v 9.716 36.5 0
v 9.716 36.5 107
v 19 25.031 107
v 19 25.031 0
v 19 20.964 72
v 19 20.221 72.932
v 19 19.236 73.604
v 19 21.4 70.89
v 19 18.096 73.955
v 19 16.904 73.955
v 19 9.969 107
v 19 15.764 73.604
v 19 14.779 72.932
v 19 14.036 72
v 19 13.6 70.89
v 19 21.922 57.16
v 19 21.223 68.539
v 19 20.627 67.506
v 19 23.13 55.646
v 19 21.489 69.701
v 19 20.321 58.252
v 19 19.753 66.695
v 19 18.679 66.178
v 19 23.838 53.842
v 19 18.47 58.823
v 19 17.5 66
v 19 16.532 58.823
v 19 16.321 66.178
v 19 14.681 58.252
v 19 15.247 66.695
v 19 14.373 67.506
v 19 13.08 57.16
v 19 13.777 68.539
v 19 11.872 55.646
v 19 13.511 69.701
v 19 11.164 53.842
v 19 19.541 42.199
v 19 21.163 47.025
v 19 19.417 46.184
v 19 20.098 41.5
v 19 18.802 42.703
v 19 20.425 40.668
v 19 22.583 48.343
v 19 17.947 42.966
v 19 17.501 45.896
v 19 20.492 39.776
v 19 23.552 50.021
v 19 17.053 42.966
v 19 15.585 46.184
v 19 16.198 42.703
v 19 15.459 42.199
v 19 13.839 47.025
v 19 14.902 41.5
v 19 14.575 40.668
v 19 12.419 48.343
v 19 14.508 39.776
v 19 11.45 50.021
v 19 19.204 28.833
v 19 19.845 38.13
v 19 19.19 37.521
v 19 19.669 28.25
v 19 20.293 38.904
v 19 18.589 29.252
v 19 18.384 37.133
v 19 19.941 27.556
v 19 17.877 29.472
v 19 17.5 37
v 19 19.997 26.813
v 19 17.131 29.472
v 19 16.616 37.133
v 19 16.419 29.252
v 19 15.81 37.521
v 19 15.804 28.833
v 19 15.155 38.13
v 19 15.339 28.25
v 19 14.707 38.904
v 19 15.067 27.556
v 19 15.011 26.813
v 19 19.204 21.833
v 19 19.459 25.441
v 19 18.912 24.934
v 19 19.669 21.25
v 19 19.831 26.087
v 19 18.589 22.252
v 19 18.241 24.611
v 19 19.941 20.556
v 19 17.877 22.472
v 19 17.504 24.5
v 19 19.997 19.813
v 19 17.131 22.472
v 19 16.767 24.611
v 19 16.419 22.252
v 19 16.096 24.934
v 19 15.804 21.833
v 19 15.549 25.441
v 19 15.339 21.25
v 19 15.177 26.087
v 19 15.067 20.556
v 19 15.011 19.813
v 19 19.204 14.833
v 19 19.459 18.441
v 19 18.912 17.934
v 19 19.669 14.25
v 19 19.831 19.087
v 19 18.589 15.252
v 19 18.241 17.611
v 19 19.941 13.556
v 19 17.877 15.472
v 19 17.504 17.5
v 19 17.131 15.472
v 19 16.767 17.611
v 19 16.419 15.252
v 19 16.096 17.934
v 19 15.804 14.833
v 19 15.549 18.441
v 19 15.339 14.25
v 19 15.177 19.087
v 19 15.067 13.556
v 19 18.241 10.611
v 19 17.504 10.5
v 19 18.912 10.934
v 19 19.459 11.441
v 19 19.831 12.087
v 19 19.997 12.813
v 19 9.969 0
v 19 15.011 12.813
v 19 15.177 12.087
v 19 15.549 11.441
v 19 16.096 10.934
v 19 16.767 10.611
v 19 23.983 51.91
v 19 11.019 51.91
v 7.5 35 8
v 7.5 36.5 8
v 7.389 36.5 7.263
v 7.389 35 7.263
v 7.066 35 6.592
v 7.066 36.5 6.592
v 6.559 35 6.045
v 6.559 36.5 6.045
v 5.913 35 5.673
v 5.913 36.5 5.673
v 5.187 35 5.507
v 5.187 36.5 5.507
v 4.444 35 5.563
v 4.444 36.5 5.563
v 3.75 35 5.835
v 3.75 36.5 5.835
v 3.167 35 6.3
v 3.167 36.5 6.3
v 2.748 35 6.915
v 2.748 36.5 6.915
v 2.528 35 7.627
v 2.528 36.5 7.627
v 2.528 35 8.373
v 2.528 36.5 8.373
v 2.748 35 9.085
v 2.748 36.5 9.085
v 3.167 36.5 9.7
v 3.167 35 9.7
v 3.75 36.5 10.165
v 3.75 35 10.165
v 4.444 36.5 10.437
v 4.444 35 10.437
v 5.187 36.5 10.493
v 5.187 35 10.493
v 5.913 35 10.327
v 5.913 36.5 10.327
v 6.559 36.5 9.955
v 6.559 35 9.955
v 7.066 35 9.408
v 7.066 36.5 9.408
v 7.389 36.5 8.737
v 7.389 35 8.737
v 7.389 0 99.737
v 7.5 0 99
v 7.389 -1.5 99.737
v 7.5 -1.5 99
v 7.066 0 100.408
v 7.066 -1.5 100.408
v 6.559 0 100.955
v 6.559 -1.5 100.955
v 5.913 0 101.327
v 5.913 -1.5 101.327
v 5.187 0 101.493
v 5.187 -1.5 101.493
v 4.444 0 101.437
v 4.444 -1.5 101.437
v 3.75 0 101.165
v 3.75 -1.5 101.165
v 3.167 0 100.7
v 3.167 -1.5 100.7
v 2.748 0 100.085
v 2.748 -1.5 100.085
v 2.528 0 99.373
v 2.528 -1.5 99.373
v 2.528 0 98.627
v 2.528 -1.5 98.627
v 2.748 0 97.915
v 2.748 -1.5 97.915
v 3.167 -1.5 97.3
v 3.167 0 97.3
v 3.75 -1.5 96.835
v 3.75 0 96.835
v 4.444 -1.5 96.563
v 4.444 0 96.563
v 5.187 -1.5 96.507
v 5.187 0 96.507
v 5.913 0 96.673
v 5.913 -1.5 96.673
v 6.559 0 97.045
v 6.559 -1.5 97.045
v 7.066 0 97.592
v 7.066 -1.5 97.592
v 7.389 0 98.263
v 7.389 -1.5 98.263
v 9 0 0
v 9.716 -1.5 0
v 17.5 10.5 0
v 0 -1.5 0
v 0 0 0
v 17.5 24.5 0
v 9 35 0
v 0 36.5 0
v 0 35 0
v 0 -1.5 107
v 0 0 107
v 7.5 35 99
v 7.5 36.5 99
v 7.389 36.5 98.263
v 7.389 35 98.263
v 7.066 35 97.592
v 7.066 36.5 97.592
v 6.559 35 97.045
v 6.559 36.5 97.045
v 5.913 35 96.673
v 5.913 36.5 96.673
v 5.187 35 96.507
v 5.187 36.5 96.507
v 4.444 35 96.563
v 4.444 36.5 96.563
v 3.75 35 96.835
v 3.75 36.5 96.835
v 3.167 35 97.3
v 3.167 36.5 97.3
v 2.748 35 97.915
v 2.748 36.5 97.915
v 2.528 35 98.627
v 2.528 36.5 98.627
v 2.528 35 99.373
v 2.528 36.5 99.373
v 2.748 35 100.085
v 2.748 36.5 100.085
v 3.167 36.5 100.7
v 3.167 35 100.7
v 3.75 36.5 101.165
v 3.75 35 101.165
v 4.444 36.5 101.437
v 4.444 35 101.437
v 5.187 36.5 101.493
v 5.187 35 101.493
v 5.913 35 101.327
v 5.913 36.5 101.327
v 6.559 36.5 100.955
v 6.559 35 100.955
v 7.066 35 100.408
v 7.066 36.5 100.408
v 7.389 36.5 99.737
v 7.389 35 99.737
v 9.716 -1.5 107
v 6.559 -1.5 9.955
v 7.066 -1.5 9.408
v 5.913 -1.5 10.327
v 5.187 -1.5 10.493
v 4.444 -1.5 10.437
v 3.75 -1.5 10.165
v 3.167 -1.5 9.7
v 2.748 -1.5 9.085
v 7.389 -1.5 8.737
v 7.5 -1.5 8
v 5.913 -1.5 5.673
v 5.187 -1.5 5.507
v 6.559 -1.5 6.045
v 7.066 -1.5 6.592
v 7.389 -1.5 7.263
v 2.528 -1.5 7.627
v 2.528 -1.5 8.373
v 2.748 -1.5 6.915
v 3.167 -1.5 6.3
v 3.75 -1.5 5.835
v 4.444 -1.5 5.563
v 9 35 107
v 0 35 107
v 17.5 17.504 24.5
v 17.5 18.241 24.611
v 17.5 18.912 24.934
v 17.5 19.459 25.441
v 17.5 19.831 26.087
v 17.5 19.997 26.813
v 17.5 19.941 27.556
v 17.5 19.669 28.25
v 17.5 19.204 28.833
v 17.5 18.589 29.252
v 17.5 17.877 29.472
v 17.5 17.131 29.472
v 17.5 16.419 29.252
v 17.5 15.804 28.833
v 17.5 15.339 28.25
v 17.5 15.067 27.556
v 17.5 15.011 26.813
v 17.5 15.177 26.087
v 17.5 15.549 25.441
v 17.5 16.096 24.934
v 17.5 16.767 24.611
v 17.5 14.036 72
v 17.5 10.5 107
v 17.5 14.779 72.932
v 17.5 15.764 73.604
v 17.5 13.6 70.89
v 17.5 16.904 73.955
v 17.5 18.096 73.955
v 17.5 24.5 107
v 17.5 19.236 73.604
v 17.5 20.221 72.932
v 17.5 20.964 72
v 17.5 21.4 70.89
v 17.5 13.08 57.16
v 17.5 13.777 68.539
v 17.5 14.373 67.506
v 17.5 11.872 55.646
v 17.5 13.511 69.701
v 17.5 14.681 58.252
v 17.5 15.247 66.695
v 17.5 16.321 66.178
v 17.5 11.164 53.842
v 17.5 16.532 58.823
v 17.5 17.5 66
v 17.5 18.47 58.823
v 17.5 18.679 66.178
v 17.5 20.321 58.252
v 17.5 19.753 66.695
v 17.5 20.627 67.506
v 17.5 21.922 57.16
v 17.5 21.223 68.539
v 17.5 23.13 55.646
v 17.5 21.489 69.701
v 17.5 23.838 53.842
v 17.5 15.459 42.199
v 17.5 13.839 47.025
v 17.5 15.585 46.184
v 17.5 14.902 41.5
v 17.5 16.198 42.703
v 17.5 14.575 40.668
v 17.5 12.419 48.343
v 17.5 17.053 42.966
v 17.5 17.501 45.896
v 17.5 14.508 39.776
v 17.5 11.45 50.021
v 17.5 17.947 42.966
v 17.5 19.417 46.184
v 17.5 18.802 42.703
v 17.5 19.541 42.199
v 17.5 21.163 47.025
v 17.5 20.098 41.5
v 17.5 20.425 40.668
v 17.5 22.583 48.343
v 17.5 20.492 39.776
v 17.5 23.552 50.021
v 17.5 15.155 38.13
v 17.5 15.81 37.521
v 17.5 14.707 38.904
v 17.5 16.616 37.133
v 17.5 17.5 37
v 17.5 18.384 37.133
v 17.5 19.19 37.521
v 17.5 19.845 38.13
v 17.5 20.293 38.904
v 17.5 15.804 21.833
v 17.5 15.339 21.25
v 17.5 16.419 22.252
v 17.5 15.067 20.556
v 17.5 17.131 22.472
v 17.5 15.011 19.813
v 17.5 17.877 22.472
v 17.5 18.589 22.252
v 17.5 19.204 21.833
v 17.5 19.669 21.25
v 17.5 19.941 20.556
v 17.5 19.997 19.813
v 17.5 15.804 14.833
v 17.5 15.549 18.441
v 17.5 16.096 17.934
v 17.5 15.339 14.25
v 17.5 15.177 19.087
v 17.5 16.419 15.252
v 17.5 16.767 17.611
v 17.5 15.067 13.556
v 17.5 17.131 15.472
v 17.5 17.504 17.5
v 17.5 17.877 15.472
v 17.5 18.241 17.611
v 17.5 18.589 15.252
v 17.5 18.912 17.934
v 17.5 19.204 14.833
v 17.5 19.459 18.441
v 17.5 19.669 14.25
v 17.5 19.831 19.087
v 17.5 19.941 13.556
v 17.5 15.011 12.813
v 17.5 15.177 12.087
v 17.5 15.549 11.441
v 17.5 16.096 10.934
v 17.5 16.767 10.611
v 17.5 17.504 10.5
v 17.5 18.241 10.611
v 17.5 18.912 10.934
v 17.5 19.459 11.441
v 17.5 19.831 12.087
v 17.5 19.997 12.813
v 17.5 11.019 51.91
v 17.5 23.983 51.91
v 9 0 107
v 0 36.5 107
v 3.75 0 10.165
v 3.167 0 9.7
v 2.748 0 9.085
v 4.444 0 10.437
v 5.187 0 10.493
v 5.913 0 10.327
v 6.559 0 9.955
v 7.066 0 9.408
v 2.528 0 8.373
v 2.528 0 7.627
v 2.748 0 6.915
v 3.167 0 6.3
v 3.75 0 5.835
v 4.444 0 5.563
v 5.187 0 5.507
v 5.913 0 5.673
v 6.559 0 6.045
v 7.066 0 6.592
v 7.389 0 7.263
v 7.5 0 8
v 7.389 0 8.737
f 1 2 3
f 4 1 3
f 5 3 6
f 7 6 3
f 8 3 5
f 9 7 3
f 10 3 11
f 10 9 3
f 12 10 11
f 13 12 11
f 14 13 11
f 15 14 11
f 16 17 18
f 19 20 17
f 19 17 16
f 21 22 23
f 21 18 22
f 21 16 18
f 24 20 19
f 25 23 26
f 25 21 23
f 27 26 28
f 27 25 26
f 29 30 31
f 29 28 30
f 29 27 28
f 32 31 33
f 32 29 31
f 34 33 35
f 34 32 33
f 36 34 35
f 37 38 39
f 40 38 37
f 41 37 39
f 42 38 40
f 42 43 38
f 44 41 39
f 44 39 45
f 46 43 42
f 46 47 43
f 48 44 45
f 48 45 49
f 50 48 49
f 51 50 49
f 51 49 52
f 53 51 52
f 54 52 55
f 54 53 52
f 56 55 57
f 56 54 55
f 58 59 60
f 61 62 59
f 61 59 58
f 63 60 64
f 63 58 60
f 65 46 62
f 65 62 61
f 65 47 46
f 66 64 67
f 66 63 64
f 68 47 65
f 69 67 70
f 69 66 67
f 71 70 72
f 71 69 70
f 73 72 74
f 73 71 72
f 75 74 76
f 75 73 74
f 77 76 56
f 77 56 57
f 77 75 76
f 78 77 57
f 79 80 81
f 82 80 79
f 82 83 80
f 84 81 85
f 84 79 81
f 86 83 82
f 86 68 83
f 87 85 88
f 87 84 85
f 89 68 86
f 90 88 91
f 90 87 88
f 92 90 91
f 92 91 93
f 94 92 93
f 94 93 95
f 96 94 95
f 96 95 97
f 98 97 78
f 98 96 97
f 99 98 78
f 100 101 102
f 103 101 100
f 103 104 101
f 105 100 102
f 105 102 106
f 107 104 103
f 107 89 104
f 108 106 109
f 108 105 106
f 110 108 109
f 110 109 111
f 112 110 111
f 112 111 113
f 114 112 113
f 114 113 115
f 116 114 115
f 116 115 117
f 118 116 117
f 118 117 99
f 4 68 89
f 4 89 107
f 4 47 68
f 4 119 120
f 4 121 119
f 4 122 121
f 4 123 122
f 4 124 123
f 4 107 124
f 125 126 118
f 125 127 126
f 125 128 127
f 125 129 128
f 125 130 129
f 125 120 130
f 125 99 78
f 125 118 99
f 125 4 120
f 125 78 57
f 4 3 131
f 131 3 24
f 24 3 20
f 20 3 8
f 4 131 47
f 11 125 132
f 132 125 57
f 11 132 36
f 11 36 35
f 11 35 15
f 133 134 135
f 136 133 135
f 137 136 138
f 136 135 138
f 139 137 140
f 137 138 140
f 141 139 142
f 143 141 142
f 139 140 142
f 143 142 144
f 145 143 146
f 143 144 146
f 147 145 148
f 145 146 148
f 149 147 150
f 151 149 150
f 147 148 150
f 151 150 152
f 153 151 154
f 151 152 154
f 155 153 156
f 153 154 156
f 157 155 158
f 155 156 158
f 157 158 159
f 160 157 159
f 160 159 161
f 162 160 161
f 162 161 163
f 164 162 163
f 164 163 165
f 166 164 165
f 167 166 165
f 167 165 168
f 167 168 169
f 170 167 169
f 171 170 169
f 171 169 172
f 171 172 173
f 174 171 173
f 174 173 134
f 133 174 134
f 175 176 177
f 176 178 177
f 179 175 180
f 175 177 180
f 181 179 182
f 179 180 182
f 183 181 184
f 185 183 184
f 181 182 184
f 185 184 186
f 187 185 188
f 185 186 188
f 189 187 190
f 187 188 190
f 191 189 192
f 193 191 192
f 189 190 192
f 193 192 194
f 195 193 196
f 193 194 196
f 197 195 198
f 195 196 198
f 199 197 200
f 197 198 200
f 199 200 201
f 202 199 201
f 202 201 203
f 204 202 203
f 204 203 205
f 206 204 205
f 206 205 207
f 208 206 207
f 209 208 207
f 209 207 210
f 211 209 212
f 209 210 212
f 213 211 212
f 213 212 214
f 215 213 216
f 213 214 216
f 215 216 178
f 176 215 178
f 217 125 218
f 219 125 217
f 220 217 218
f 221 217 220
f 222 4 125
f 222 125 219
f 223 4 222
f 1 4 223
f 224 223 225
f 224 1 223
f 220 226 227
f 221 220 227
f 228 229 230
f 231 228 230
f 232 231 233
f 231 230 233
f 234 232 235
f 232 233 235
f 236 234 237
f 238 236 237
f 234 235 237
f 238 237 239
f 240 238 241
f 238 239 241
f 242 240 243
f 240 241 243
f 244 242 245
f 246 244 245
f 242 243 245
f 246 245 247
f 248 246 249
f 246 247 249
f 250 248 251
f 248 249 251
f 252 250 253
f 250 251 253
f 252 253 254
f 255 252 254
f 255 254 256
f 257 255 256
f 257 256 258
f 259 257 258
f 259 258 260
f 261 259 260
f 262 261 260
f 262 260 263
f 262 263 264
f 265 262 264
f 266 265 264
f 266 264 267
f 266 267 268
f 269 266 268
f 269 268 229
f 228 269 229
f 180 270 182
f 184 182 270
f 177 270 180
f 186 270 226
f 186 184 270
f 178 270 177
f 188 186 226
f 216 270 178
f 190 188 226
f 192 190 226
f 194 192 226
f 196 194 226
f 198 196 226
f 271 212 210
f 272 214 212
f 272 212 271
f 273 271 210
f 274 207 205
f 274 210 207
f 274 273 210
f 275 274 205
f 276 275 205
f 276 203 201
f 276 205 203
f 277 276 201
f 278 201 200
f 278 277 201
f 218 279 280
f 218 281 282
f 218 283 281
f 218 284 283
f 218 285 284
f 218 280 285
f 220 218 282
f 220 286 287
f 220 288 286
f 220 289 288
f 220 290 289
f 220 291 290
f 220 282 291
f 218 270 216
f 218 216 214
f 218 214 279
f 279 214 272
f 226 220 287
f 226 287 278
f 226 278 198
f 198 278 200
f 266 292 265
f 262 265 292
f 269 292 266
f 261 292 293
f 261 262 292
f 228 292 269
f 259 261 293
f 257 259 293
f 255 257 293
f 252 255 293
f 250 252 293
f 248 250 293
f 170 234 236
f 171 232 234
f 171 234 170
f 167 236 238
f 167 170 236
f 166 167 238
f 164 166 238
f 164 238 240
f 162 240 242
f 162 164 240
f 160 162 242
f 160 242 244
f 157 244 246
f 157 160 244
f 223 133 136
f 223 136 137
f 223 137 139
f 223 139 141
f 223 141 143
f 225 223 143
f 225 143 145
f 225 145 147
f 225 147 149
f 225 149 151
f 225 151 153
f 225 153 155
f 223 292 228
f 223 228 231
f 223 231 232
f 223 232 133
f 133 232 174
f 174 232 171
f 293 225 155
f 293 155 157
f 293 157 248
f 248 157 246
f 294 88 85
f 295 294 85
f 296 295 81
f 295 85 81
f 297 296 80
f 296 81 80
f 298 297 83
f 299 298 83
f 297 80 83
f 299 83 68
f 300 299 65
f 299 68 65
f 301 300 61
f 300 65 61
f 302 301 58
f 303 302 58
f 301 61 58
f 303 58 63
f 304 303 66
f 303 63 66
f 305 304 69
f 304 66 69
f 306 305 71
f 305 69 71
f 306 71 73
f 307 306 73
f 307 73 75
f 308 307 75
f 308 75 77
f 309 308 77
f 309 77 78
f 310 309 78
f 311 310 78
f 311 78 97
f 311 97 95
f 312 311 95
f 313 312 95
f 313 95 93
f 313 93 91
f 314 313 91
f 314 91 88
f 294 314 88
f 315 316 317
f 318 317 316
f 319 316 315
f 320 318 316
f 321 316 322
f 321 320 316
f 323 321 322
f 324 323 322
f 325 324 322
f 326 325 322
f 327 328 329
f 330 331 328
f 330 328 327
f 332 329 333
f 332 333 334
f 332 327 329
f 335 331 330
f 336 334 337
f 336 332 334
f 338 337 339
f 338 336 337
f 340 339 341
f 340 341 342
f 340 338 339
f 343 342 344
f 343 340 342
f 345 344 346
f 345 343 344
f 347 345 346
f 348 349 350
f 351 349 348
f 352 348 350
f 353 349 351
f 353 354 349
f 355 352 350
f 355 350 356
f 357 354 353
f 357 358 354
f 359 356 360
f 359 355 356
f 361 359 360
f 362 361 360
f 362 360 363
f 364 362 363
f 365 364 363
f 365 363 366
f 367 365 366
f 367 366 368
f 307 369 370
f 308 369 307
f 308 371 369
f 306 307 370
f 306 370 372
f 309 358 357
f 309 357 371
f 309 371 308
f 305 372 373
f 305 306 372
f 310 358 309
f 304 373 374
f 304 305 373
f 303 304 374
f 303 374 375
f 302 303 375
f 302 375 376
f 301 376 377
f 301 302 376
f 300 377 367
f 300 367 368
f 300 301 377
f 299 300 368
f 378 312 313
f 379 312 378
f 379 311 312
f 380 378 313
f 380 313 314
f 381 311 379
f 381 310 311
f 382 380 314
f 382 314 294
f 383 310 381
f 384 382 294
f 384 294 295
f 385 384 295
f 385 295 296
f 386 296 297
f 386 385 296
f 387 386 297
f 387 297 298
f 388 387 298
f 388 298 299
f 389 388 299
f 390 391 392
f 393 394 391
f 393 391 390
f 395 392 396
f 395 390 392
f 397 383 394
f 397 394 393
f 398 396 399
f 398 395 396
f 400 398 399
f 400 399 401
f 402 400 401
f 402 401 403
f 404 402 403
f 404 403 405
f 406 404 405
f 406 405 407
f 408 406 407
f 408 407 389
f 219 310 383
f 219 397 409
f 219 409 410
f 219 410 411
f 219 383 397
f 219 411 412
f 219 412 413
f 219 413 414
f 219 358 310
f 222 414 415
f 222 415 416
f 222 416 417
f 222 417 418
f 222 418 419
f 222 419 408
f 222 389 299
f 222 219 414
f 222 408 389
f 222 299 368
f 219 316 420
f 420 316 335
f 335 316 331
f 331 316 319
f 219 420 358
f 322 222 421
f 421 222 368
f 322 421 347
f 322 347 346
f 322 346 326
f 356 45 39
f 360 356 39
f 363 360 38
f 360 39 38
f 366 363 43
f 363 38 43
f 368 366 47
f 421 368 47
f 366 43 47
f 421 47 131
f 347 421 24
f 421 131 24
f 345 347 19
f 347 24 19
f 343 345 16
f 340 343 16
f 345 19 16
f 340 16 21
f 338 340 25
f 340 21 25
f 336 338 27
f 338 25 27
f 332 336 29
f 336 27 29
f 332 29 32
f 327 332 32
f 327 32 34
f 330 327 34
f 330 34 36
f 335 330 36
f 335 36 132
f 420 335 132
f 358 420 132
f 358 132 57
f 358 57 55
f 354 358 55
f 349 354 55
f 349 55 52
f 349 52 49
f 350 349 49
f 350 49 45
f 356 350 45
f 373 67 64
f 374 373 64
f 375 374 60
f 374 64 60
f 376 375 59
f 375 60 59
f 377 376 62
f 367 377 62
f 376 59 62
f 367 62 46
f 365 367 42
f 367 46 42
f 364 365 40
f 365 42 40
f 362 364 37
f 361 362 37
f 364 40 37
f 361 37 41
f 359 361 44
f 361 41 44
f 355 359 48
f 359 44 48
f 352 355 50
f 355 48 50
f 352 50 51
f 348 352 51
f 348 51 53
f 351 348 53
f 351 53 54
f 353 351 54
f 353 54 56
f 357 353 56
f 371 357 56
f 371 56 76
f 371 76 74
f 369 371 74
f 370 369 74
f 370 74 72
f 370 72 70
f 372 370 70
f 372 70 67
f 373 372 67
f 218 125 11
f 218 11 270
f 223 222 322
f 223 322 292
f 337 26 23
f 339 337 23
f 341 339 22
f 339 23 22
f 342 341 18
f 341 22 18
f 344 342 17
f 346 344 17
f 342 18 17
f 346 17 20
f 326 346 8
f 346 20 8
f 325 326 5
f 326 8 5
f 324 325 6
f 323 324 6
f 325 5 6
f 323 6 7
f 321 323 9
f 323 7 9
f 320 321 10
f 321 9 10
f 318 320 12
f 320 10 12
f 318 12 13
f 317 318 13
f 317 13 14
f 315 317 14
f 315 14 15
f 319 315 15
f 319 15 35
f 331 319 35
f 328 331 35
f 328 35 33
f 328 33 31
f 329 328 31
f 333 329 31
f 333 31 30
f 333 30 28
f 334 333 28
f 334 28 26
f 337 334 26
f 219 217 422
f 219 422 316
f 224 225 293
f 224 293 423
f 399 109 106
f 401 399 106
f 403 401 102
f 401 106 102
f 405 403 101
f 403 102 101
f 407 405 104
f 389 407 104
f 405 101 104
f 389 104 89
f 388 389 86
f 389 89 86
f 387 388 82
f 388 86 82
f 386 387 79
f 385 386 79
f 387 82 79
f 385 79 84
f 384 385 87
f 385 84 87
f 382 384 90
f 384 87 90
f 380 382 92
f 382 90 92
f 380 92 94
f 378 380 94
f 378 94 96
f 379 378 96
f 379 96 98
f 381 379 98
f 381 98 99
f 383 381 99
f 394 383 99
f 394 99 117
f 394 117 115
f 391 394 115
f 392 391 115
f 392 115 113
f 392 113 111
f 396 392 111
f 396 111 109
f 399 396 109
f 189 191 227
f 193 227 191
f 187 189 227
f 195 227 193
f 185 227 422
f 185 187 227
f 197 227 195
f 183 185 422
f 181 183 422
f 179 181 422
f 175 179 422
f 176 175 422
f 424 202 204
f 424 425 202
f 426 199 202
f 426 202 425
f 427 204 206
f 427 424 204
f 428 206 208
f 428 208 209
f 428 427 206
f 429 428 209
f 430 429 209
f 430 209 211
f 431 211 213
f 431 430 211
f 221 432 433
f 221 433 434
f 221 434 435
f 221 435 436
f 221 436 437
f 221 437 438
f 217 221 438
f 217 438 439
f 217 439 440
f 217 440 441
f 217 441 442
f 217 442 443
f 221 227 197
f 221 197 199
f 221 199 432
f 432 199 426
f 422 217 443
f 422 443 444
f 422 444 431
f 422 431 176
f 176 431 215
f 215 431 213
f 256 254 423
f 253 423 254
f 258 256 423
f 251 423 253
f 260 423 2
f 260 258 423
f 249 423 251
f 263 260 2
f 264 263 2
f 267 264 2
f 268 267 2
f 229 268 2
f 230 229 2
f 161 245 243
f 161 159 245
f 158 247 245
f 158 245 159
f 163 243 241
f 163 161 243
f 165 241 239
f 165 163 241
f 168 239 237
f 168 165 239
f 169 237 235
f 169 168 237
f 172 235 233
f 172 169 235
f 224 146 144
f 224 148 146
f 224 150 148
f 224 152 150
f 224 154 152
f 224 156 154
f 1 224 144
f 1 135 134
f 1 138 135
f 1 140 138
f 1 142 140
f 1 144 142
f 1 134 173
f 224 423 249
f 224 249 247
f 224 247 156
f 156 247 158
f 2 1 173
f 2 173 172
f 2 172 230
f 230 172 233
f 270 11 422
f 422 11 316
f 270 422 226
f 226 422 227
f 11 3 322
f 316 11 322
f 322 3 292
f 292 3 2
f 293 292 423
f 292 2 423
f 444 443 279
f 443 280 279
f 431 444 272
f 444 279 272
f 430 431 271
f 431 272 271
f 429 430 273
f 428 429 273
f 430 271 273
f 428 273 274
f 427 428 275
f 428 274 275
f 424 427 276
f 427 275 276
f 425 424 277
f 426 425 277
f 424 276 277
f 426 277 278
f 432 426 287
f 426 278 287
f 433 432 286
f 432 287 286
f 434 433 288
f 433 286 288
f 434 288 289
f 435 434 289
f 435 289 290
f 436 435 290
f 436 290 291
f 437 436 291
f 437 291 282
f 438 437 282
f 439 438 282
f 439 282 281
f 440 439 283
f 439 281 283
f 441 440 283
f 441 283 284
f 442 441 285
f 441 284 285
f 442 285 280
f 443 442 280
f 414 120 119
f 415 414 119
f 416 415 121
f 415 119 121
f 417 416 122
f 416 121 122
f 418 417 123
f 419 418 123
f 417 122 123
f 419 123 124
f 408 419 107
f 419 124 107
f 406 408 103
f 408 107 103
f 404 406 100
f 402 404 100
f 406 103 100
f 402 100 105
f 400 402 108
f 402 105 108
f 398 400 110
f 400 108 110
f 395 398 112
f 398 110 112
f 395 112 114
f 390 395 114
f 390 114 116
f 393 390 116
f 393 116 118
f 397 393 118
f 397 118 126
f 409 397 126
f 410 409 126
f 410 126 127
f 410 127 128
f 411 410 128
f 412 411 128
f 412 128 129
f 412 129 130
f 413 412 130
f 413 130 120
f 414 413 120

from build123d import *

# Parameters (mm, degrees)
SALIENTE_EXTRUIR1_DEPTH = 107
CORTAR_EXTRUIR1_REACH   = 40
CROQUIS3_R              = 2.5
CORTAR_EXTRUIR2_REACH   = 40
CROQUIS4_R              = 2.5
CORTAR_EXTRUIR3_REACH   = 21
CROQUIS5_R              = 3
CROQUIS5_R_2            = 4
CORTAR_EXTRUIR4_REACH   = 21
CROQUIS6_R              = 6.5
CORTAR_EXTRUIR5_REACH   = 21
CROQUIS7_R              = 2.5


with BuildPart() as part:
    # Croquis1 → Saliente-Extruir1 (new body)
    with BuildSketch(Plane.XY):
        Polygon((0, 0), (9, 0), (17.5, 10.5), (17.5, 24.5), (9, 35), (0, 35), (0, 36.5), (9.715608012, 36.5), (19, 25.031045192), (19, 9.968954808), (9.715608012, -1.5), (0, -1.5), align=None)
    extrude(amount=SALIENTE_EXTRUIR1_DEPTH)

    # Croquis3 → Cortar-Extruir1 (cut, up to next)
    with BuildSketch(Plane(origin=(0, 36.5, 0), x_dir=(1, 0, 0), z_dir=(0, 1, 0)), mode=Mode.PRIVATE) as cortar_extruir1_sk1:
        with Locations((5, -8)):
            Circle(CROQUIS3_R)
    cortar_extruir1_tool1 = extrude(cortar_extruir1_sk1.sketch, amount=-CORTAR_EXTRUIR1_REACH, mode=Mode.PRIVATE) & part.part
    add(cortar_extruir1_tool1.solids().sort_by_distance((5, 36.5, 8))[0], mode=Mode.SUBTRACT)
    # Croquis3 → Cortar-Extruir1 (cut, up to next)
    with BuildSketch(Plane(origin=(0, 36.5, 0), x_dir=(1, 0, 0), z_dir=(0, 1, 0)), mode=Mode.PRIVATE) as cortar_extruir1_sk2:
        with Locations((5, -99)):
            Circle(CROQUIS3_R)
    cortar_extruir1_tool2 = extrude(cortar_extruir1_sk2.sketch, amount=-CORTAR_EXTRUIR1_REACH, mode=Mode.PRIVATE) & part.part
    add(cortar_extruir1_tool2.solids().sort_by_distance((5, 36.5, 99))[0], mode=Mode.SUBTRACT)

    # Croquis4 → Cortar-Extruir2 (cut, up to next)
    with BuildSketch(Plane.XZ.offset(1.5), mode=Mode.PRIVATE) as cortar_extruir2_sk1:
        with Locations((5, 8)):
            Circle(CROQUIS4_R)
    cortar_extruir2_tool1 = extrude(cortar_extruir2_sk1.sketch, amount=-CORTAR_EXTRUIR2_REACH, mode=Mode.PRIVATE) & part.part
    add(cortar_extruir2_tool1.solids().sort_by_distance((5, -1.5, 8))[0], mode=Mode.SUBTRACT)
    # Croquis4 → Cortar-Extruir2 (cut, up to next)
    with BuildSketch(Plane.XZ.offset(1.5), mode=Mode.PRIVATE) as cortar_extruir2_sk2:
        with Locations((5, 99)):
            Circle(CROQUIS4_R)
    cortar_extruir2_tool2 = extrude(cortar_extruir2_sk2.sketch, amount=-CORTAR_EXTRUIR2_REACH, mode=Mode.PRIVATE) & part.part
    add(cortar_extruir2_tool2.solids().sort_by_distance((5, -1.5, 99))[0], mode=Mode.SUBTRACT)

    # Croquis5 → Cortar-Extruir3 (cut, up to next)
    with BuildSketch(Plane(origin=(19, 0, 0), x_dir=(0, 0, -1), z_dir=(1, 0, 0)), mode=Mode.PRIVATE) as cortar_extruir3_sk1:
        with Locations((-40, 17.5)):
            Circle(CROQUIS5_R)
    cortar_extruir3_tool1 = extrude(cortar_extruir3_sk1.sketch, amount=-CORTAR_EXTRUIR3_REACH, mode=Mode.PRIVATE) & part.part
    add(cortar_extruir3_tool1.solids().sort_by_distance((19, 17.5, 40))[0], mode=Mode.SUBTRACT)
    # Croquis5 → Cortar-Extruir3 (cut, up to next)
    with BuildSketch(Plane(origin=(19, 0, 0), x_dir=(0, 0, -1), z_dir=(1, 0, 0)), mode=Mode.PRIVATE) as cortar_extruir3_sk2:
        with Locations((-70, 17.5)):
            Circle(CROQUIS5_R_2)
    cortar_extruir3_tool2 = extrude(cortar_extruir3_sk2.sketch, amount=-CORTAR_EXTRUIR3_REACH, mode=Mode.PRIVATE) & part.part
    add(cortar_extruir3_tool2.solids().sort_by_distance((19, 17.5, 70))[0], mode=Mode.SUBTRACT)

    # Croquis6 → Cortar-Extruir4 (cut, up to next)
    with BuildSketch(Plane(origin=(19, 0, 0), x_dir=(0, 0, -1), z_dir=(1, 0, 0)), mode=Mode.PRIVATE) as cortar_extruir4_sk1:
        with Locations((-52.395650843, 17.501045192)):
            Circle(CROQUIS6_R)
    cortar_extruir4_tool1 = extrude(cortar_extruir4_sk1.sketch, amount=-CORTAR_EXTRUIR4_REACH, mode=Mode.PRIVATE) & part.part
    add(cortar_extruir4_tool1.solids().sort_by_distance((19, 17.501045, 52.395651))[0], mode=Mode.SUBTRACT)

    # Croquis7 → Cortar-Extruir5 (cut, up to next)
    with BuildSketch(Plane(origin=(19, 0, 0), x_dir=(0, 0, -1), z_dir=(1, 0, 0)), mode=Mode.PRIVATE) as cortar_extruir5_sk1:
        with Locations((-27, 17.503954808)):
            Circle(CROQUIS7_R)
    cortar_extruir5_tool1 = extrude(cortar_extruir5_sk1.sketch, amount=-CORTAR_EXTRUIR5_REACH, mode=Mode.PRIVATE) & part.part
    add(cortar_extruir5_tool1.solids().sort_by_distance((19, 17.503955, 27))[0], mode=Mode.SUBTRACT)
    # Croquis7 → Cortar-Extruir5 (cut, up to next)
    with BuildSketch(Plane(origin=(19, 0, 0), x_dir=(0, 0, -1), z_dir=(1, 0, 0)), mode=Mode.PRIVATE) as cortar_extruir5_sk2:
        with Locations((-20, 17.503954808)):
            Circle(CROQUIS7_R)
    cortar_extruir5_tool2 = extrude(cortar_extruir5_sk2.sketch, amount=-CORTAR_EXTRUIR5_REACH, mode=Mode.PRIVATE) & part.part
    add(cortar_extruir5_tool2.solids().sort_by_distance((19, 17.503955, 20))[0], mode=Mode.SUBTRACT)
    # Croquis7 → Cortar-Extruir5 (cut, up to next)
    with BuildSketch(Plane(origin=(19, 0, 0), x_dir=(0, 0, -1), z_dir=(1, 0, 0)), mode=Mode.PRIVATE) as cortar_extruir5_sk3:
        with Locations((-13, 17.503954808)):
            Circle(CROQUIS7_R)
    cortar_extruir5_tool3 = extrude(cortar_extruir5_sk3.sketch, amount=-CORTAR_EXTRUIR5_REACH, mode=Mode.PRIVATE) & part.part
    add(cortar_extruir5_tool3.solids().sort_by_distance((19, 17.503955, 13))[0], mode=Mode.SUBTRACT)


solid = part.part
